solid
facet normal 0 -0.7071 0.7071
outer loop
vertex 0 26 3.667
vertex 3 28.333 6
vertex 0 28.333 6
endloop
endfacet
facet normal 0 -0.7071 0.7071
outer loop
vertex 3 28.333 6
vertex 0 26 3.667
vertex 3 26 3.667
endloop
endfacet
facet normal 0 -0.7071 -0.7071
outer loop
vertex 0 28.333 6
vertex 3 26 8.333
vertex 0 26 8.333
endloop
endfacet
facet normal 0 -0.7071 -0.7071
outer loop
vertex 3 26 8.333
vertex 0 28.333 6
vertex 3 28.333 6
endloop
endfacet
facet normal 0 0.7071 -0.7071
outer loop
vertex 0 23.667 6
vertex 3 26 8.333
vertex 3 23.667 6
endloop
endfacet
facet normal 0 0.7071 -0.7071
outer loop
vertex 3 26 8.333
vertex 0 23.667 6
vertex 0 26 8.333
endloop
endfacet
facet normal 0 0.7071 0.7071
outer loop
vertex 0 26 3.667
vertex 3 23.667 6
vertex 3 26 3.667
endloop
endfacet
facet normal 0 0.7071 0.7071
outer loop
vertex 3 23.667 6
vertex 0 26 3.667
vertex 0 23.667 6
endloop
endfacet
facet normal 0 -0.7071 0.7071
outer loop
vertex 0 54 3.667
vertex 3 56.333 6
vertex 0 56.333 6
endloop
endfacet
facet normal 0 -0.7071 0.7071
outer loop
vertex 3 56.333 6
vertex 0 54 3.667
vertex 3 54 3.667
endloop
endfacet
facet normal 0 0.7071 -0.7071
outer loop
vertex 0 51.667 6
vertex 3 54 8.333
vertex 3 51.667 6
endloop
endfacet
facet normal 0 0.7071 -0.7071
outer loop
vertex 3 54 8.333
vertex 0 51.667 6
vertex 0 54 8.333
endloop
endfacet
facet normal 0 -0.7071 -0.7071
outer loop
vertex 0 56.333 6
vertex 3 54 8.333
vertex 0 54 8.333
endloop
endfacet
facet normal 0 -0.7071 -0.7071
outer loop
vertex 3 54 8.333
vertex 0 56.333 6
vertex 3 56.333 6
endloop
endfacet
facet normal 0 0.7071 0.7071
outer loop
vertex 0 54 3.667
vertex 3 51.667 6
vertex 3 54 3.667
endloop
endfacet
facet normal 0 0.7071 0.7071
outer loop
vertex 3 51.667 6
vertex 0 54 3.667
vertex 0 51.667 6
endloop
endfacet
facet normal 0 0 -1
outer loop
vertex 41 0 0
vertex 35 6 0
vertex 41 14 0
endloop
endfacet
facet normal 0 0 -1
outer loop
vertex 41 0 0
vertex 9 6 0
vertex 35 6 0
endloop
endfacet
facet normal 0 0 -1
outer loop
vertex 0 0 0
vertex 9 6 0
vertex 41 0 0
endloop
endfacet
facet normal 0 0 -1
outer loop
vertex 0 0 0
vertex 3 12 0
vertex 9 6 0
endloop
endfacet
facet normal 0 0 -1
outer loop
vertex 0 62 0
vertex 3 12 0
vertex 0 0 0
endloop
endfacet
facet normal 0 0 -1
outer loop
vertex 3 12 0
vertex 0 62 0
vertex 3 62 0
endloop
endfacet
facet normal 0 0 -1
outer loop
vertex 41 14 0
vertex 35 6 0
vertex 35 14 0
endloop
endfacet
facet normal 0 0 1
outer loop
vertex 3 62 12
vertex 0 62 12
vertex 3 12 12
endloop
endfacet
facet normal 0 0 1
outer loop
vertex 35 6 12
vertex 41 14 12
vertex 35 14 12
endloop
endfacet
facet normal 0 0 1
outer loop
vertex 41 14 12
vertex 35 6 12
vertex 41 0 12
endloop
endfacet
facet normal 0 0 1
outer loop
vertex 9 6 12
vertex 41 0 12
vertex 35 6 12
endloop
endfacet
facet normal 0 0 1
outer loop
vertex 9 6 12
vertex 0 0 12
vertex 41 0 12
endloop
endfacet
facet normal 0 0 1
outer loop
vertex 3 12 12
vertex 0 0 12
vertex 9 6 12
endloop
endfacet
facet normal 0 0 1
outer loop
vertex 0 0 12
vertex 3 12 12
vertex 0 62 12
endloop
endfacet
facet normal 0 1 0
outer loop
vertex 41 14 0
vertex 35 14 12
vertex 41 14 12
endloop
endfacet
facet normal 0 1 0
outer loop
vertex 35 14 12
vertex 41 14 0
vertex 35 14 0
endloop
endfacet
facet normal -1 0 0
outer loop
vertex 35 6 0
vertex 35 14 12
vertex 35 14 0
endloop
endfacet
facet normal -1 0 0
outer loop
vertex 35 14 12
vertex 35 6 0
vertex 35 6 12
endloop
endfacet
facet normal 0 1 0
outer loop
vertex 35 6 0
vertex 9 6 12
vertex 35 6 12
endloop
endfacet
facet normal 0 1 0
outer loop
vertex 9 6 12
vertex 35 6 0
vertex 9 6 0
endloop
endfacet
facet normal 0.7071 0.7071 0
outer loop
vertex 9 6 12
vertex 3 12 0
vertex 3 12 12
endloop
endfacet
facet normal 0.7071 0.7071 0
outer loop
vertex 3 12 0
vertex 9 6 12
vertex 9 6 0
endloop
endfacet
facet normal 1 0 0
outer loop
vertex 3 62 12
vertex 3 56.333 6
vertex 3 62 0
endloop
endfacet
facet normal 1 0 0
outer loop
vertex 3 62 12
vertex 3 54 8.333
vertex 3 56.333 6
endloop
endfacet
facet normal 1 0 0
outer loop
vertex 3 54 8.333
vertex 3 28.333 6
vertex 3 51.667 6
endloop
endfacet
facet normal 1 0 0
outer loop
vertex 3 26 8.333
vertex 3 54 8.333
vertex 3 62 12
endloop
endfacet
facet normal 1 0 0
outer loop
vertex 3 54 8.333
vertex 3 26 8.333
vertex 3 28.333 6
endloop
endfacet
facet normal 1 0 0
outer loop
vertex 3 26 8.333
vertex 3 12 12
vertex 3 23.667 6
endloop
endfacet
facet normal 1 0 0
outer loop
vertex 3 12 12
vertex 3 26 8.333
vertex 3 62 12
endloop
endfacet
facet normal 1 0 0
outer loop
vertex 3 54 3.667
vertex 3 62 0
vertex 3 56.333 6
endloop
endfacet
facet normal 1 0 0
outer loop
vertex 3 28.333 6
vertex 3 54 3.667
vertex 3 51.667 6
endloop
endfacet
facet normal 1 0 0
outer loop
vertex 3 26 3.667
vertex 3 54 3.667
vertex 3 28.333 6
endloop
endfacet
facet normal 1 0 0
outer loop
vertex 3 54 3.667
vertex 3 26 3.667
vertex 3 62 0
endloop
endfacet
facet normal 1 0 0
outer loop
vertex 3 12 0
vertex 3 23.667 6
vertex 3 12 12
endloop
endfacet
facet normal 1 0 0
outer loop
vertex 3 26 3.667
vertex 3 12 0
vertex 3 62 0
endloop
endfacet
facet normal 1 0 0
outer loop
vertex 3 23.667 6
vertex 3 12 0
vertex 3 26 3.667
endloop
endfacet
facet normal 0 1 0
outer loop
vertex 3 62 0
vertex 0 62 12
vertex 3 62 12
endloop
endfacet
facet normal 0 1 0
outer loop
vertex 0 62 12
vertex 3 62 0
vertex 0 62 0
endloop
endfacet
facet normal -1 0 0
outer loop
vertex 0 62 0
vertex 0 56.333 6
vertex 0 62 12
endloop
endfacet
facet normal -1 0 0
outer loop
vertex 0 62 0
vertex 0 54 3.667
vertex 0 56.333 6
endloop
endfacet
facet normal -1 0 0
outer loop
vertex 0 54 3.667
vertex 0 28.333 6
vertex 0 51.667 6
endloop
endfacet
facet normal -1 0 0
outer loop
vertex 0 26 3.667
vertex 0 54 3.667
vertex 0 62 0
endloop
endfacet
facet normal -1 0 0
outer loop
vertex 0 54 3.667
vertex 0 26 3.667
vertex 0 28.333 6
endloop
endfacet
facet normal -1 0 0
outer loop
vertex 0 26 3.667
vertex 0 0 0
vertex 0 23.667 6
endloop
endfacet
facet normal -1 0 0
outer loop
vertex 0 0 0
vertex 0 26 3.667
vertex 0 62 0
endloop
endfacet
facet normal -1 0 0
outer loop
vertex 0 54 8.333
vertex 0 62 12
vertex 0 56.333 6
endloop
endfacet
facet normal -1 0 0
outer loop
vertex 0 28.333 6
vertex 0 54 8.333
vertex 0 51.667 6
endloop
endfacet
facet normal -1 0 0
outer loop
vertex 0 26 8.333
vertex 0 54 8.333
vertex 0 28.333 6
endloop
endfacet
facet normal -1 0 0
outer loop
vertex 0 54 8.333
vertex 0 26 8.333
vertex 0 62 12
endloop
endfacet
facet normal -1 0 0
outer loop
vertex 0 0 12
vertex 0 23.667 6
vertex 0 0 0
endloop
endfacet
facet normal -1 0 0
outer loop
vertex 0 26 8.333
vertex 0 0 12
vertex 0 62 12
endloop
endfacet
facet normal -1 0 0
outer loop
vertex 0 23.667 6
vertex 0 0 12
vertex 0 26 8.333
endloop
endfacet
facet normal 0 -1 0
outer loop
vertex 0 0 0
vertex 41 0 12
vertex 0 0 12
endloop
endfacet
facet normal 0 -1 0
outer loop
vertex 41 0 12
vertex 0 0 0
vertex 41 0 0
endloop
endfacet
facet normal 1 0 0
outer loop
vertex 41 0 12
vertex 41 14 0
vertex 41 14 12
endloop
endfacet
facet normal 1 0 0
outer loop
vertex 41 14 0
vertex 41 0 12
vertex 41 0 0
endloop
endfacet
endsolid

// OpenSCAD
// openGrid screw-snap hook for cables and light hand tools; dimensions in mm.
// Print as shown, broad side at Z=0, no supports; 4 perimeters recommended.
// Install with +Y upward and +X away from the board. Two M3 directional metric
// screw snaps, 28 mm apart vertically, and two M3 screws/washers are required.
// Use Lite snaps for a 4 mm board, Full snaps for a 6.8 mm board, arrows up.
// Engagement = screw length - back thickness - washer thickness; M3x6 with
// the default back and a 0.5 mm washer engages 2.5 mm. Check the snap's actual
// thread depth; do not let screw tips bottom out or press against the wall.
// Original accessory geometry; no downloaded meshes or snap code incorporated.
// openGrid by David D: CC BY 4.0 core parts, https://www.opengrid.world/guides/
// Interface: https://www.opengrid.world/guides/snaps/
// Ecosystem: https://handsonkatie.com/home-organisation-library/?_system=opengrid
// Fit and load capacity require a physical trial print.

// Usable reach in front of the backplate (mm).
reach = 32; // [20:2:60]
// Width of the hook, also its printed height (mm).
hook_width = 12; // [10:1:20]
// Arm thickness in its bending direction (mm).
arm_thickness = 6; // [4:1:10]
// Retaining lip above the arm (mm).
lip_height = 8; // [4:1:16]
// Backplate thickness; add this to screw engagement length (mm).
back_thickness = 3; // [3:0.5:5]
// Extra diametral clearance for the M3 screw shanks (mm).
tolerance = 0.3; // [0.2:0.05:0.4]

/* [Hidden] */
pitch = 28;
screw_diameter = 3;
lower_hole = 2 * arm_thickness + lip_height + 6;
back_height = lower_hole + pitch + 8;
tip = back_thickness + reach;
eps = 0.02;

// One extruded profile keeps the arm continuous with the upright and lip.
color("#f0965a") difference() {
    linear_extrude(height = hook_width)
        polygon(points = [
            [0, 0], [tip + arm_thickness, 0],
            [tip + arm_thickness, arm_thickness + lip_height],
            [tip, arm_thickness + lip_height], [tip, arm_thickness],
            [back_thickness + arm_thickness, arm_thickness],
            [back_thickness, 2 * arm_thickness],
            [back_thickness, back_height], [0, back_height]
        ]);
    // Diamond bores enclose a round M3 screw and have 45-degree roofs.
    for (y = [lower_hole, lower_hole + pitch])
        translate([back_thickness / 2, y, hook_width / 2])
            rotate([45, 0, 0])
                cube([back_thickness + 2 * eps,
                      screw_diameter + tolerance,
                      screw_diameter + tolerance], center = true);
}
